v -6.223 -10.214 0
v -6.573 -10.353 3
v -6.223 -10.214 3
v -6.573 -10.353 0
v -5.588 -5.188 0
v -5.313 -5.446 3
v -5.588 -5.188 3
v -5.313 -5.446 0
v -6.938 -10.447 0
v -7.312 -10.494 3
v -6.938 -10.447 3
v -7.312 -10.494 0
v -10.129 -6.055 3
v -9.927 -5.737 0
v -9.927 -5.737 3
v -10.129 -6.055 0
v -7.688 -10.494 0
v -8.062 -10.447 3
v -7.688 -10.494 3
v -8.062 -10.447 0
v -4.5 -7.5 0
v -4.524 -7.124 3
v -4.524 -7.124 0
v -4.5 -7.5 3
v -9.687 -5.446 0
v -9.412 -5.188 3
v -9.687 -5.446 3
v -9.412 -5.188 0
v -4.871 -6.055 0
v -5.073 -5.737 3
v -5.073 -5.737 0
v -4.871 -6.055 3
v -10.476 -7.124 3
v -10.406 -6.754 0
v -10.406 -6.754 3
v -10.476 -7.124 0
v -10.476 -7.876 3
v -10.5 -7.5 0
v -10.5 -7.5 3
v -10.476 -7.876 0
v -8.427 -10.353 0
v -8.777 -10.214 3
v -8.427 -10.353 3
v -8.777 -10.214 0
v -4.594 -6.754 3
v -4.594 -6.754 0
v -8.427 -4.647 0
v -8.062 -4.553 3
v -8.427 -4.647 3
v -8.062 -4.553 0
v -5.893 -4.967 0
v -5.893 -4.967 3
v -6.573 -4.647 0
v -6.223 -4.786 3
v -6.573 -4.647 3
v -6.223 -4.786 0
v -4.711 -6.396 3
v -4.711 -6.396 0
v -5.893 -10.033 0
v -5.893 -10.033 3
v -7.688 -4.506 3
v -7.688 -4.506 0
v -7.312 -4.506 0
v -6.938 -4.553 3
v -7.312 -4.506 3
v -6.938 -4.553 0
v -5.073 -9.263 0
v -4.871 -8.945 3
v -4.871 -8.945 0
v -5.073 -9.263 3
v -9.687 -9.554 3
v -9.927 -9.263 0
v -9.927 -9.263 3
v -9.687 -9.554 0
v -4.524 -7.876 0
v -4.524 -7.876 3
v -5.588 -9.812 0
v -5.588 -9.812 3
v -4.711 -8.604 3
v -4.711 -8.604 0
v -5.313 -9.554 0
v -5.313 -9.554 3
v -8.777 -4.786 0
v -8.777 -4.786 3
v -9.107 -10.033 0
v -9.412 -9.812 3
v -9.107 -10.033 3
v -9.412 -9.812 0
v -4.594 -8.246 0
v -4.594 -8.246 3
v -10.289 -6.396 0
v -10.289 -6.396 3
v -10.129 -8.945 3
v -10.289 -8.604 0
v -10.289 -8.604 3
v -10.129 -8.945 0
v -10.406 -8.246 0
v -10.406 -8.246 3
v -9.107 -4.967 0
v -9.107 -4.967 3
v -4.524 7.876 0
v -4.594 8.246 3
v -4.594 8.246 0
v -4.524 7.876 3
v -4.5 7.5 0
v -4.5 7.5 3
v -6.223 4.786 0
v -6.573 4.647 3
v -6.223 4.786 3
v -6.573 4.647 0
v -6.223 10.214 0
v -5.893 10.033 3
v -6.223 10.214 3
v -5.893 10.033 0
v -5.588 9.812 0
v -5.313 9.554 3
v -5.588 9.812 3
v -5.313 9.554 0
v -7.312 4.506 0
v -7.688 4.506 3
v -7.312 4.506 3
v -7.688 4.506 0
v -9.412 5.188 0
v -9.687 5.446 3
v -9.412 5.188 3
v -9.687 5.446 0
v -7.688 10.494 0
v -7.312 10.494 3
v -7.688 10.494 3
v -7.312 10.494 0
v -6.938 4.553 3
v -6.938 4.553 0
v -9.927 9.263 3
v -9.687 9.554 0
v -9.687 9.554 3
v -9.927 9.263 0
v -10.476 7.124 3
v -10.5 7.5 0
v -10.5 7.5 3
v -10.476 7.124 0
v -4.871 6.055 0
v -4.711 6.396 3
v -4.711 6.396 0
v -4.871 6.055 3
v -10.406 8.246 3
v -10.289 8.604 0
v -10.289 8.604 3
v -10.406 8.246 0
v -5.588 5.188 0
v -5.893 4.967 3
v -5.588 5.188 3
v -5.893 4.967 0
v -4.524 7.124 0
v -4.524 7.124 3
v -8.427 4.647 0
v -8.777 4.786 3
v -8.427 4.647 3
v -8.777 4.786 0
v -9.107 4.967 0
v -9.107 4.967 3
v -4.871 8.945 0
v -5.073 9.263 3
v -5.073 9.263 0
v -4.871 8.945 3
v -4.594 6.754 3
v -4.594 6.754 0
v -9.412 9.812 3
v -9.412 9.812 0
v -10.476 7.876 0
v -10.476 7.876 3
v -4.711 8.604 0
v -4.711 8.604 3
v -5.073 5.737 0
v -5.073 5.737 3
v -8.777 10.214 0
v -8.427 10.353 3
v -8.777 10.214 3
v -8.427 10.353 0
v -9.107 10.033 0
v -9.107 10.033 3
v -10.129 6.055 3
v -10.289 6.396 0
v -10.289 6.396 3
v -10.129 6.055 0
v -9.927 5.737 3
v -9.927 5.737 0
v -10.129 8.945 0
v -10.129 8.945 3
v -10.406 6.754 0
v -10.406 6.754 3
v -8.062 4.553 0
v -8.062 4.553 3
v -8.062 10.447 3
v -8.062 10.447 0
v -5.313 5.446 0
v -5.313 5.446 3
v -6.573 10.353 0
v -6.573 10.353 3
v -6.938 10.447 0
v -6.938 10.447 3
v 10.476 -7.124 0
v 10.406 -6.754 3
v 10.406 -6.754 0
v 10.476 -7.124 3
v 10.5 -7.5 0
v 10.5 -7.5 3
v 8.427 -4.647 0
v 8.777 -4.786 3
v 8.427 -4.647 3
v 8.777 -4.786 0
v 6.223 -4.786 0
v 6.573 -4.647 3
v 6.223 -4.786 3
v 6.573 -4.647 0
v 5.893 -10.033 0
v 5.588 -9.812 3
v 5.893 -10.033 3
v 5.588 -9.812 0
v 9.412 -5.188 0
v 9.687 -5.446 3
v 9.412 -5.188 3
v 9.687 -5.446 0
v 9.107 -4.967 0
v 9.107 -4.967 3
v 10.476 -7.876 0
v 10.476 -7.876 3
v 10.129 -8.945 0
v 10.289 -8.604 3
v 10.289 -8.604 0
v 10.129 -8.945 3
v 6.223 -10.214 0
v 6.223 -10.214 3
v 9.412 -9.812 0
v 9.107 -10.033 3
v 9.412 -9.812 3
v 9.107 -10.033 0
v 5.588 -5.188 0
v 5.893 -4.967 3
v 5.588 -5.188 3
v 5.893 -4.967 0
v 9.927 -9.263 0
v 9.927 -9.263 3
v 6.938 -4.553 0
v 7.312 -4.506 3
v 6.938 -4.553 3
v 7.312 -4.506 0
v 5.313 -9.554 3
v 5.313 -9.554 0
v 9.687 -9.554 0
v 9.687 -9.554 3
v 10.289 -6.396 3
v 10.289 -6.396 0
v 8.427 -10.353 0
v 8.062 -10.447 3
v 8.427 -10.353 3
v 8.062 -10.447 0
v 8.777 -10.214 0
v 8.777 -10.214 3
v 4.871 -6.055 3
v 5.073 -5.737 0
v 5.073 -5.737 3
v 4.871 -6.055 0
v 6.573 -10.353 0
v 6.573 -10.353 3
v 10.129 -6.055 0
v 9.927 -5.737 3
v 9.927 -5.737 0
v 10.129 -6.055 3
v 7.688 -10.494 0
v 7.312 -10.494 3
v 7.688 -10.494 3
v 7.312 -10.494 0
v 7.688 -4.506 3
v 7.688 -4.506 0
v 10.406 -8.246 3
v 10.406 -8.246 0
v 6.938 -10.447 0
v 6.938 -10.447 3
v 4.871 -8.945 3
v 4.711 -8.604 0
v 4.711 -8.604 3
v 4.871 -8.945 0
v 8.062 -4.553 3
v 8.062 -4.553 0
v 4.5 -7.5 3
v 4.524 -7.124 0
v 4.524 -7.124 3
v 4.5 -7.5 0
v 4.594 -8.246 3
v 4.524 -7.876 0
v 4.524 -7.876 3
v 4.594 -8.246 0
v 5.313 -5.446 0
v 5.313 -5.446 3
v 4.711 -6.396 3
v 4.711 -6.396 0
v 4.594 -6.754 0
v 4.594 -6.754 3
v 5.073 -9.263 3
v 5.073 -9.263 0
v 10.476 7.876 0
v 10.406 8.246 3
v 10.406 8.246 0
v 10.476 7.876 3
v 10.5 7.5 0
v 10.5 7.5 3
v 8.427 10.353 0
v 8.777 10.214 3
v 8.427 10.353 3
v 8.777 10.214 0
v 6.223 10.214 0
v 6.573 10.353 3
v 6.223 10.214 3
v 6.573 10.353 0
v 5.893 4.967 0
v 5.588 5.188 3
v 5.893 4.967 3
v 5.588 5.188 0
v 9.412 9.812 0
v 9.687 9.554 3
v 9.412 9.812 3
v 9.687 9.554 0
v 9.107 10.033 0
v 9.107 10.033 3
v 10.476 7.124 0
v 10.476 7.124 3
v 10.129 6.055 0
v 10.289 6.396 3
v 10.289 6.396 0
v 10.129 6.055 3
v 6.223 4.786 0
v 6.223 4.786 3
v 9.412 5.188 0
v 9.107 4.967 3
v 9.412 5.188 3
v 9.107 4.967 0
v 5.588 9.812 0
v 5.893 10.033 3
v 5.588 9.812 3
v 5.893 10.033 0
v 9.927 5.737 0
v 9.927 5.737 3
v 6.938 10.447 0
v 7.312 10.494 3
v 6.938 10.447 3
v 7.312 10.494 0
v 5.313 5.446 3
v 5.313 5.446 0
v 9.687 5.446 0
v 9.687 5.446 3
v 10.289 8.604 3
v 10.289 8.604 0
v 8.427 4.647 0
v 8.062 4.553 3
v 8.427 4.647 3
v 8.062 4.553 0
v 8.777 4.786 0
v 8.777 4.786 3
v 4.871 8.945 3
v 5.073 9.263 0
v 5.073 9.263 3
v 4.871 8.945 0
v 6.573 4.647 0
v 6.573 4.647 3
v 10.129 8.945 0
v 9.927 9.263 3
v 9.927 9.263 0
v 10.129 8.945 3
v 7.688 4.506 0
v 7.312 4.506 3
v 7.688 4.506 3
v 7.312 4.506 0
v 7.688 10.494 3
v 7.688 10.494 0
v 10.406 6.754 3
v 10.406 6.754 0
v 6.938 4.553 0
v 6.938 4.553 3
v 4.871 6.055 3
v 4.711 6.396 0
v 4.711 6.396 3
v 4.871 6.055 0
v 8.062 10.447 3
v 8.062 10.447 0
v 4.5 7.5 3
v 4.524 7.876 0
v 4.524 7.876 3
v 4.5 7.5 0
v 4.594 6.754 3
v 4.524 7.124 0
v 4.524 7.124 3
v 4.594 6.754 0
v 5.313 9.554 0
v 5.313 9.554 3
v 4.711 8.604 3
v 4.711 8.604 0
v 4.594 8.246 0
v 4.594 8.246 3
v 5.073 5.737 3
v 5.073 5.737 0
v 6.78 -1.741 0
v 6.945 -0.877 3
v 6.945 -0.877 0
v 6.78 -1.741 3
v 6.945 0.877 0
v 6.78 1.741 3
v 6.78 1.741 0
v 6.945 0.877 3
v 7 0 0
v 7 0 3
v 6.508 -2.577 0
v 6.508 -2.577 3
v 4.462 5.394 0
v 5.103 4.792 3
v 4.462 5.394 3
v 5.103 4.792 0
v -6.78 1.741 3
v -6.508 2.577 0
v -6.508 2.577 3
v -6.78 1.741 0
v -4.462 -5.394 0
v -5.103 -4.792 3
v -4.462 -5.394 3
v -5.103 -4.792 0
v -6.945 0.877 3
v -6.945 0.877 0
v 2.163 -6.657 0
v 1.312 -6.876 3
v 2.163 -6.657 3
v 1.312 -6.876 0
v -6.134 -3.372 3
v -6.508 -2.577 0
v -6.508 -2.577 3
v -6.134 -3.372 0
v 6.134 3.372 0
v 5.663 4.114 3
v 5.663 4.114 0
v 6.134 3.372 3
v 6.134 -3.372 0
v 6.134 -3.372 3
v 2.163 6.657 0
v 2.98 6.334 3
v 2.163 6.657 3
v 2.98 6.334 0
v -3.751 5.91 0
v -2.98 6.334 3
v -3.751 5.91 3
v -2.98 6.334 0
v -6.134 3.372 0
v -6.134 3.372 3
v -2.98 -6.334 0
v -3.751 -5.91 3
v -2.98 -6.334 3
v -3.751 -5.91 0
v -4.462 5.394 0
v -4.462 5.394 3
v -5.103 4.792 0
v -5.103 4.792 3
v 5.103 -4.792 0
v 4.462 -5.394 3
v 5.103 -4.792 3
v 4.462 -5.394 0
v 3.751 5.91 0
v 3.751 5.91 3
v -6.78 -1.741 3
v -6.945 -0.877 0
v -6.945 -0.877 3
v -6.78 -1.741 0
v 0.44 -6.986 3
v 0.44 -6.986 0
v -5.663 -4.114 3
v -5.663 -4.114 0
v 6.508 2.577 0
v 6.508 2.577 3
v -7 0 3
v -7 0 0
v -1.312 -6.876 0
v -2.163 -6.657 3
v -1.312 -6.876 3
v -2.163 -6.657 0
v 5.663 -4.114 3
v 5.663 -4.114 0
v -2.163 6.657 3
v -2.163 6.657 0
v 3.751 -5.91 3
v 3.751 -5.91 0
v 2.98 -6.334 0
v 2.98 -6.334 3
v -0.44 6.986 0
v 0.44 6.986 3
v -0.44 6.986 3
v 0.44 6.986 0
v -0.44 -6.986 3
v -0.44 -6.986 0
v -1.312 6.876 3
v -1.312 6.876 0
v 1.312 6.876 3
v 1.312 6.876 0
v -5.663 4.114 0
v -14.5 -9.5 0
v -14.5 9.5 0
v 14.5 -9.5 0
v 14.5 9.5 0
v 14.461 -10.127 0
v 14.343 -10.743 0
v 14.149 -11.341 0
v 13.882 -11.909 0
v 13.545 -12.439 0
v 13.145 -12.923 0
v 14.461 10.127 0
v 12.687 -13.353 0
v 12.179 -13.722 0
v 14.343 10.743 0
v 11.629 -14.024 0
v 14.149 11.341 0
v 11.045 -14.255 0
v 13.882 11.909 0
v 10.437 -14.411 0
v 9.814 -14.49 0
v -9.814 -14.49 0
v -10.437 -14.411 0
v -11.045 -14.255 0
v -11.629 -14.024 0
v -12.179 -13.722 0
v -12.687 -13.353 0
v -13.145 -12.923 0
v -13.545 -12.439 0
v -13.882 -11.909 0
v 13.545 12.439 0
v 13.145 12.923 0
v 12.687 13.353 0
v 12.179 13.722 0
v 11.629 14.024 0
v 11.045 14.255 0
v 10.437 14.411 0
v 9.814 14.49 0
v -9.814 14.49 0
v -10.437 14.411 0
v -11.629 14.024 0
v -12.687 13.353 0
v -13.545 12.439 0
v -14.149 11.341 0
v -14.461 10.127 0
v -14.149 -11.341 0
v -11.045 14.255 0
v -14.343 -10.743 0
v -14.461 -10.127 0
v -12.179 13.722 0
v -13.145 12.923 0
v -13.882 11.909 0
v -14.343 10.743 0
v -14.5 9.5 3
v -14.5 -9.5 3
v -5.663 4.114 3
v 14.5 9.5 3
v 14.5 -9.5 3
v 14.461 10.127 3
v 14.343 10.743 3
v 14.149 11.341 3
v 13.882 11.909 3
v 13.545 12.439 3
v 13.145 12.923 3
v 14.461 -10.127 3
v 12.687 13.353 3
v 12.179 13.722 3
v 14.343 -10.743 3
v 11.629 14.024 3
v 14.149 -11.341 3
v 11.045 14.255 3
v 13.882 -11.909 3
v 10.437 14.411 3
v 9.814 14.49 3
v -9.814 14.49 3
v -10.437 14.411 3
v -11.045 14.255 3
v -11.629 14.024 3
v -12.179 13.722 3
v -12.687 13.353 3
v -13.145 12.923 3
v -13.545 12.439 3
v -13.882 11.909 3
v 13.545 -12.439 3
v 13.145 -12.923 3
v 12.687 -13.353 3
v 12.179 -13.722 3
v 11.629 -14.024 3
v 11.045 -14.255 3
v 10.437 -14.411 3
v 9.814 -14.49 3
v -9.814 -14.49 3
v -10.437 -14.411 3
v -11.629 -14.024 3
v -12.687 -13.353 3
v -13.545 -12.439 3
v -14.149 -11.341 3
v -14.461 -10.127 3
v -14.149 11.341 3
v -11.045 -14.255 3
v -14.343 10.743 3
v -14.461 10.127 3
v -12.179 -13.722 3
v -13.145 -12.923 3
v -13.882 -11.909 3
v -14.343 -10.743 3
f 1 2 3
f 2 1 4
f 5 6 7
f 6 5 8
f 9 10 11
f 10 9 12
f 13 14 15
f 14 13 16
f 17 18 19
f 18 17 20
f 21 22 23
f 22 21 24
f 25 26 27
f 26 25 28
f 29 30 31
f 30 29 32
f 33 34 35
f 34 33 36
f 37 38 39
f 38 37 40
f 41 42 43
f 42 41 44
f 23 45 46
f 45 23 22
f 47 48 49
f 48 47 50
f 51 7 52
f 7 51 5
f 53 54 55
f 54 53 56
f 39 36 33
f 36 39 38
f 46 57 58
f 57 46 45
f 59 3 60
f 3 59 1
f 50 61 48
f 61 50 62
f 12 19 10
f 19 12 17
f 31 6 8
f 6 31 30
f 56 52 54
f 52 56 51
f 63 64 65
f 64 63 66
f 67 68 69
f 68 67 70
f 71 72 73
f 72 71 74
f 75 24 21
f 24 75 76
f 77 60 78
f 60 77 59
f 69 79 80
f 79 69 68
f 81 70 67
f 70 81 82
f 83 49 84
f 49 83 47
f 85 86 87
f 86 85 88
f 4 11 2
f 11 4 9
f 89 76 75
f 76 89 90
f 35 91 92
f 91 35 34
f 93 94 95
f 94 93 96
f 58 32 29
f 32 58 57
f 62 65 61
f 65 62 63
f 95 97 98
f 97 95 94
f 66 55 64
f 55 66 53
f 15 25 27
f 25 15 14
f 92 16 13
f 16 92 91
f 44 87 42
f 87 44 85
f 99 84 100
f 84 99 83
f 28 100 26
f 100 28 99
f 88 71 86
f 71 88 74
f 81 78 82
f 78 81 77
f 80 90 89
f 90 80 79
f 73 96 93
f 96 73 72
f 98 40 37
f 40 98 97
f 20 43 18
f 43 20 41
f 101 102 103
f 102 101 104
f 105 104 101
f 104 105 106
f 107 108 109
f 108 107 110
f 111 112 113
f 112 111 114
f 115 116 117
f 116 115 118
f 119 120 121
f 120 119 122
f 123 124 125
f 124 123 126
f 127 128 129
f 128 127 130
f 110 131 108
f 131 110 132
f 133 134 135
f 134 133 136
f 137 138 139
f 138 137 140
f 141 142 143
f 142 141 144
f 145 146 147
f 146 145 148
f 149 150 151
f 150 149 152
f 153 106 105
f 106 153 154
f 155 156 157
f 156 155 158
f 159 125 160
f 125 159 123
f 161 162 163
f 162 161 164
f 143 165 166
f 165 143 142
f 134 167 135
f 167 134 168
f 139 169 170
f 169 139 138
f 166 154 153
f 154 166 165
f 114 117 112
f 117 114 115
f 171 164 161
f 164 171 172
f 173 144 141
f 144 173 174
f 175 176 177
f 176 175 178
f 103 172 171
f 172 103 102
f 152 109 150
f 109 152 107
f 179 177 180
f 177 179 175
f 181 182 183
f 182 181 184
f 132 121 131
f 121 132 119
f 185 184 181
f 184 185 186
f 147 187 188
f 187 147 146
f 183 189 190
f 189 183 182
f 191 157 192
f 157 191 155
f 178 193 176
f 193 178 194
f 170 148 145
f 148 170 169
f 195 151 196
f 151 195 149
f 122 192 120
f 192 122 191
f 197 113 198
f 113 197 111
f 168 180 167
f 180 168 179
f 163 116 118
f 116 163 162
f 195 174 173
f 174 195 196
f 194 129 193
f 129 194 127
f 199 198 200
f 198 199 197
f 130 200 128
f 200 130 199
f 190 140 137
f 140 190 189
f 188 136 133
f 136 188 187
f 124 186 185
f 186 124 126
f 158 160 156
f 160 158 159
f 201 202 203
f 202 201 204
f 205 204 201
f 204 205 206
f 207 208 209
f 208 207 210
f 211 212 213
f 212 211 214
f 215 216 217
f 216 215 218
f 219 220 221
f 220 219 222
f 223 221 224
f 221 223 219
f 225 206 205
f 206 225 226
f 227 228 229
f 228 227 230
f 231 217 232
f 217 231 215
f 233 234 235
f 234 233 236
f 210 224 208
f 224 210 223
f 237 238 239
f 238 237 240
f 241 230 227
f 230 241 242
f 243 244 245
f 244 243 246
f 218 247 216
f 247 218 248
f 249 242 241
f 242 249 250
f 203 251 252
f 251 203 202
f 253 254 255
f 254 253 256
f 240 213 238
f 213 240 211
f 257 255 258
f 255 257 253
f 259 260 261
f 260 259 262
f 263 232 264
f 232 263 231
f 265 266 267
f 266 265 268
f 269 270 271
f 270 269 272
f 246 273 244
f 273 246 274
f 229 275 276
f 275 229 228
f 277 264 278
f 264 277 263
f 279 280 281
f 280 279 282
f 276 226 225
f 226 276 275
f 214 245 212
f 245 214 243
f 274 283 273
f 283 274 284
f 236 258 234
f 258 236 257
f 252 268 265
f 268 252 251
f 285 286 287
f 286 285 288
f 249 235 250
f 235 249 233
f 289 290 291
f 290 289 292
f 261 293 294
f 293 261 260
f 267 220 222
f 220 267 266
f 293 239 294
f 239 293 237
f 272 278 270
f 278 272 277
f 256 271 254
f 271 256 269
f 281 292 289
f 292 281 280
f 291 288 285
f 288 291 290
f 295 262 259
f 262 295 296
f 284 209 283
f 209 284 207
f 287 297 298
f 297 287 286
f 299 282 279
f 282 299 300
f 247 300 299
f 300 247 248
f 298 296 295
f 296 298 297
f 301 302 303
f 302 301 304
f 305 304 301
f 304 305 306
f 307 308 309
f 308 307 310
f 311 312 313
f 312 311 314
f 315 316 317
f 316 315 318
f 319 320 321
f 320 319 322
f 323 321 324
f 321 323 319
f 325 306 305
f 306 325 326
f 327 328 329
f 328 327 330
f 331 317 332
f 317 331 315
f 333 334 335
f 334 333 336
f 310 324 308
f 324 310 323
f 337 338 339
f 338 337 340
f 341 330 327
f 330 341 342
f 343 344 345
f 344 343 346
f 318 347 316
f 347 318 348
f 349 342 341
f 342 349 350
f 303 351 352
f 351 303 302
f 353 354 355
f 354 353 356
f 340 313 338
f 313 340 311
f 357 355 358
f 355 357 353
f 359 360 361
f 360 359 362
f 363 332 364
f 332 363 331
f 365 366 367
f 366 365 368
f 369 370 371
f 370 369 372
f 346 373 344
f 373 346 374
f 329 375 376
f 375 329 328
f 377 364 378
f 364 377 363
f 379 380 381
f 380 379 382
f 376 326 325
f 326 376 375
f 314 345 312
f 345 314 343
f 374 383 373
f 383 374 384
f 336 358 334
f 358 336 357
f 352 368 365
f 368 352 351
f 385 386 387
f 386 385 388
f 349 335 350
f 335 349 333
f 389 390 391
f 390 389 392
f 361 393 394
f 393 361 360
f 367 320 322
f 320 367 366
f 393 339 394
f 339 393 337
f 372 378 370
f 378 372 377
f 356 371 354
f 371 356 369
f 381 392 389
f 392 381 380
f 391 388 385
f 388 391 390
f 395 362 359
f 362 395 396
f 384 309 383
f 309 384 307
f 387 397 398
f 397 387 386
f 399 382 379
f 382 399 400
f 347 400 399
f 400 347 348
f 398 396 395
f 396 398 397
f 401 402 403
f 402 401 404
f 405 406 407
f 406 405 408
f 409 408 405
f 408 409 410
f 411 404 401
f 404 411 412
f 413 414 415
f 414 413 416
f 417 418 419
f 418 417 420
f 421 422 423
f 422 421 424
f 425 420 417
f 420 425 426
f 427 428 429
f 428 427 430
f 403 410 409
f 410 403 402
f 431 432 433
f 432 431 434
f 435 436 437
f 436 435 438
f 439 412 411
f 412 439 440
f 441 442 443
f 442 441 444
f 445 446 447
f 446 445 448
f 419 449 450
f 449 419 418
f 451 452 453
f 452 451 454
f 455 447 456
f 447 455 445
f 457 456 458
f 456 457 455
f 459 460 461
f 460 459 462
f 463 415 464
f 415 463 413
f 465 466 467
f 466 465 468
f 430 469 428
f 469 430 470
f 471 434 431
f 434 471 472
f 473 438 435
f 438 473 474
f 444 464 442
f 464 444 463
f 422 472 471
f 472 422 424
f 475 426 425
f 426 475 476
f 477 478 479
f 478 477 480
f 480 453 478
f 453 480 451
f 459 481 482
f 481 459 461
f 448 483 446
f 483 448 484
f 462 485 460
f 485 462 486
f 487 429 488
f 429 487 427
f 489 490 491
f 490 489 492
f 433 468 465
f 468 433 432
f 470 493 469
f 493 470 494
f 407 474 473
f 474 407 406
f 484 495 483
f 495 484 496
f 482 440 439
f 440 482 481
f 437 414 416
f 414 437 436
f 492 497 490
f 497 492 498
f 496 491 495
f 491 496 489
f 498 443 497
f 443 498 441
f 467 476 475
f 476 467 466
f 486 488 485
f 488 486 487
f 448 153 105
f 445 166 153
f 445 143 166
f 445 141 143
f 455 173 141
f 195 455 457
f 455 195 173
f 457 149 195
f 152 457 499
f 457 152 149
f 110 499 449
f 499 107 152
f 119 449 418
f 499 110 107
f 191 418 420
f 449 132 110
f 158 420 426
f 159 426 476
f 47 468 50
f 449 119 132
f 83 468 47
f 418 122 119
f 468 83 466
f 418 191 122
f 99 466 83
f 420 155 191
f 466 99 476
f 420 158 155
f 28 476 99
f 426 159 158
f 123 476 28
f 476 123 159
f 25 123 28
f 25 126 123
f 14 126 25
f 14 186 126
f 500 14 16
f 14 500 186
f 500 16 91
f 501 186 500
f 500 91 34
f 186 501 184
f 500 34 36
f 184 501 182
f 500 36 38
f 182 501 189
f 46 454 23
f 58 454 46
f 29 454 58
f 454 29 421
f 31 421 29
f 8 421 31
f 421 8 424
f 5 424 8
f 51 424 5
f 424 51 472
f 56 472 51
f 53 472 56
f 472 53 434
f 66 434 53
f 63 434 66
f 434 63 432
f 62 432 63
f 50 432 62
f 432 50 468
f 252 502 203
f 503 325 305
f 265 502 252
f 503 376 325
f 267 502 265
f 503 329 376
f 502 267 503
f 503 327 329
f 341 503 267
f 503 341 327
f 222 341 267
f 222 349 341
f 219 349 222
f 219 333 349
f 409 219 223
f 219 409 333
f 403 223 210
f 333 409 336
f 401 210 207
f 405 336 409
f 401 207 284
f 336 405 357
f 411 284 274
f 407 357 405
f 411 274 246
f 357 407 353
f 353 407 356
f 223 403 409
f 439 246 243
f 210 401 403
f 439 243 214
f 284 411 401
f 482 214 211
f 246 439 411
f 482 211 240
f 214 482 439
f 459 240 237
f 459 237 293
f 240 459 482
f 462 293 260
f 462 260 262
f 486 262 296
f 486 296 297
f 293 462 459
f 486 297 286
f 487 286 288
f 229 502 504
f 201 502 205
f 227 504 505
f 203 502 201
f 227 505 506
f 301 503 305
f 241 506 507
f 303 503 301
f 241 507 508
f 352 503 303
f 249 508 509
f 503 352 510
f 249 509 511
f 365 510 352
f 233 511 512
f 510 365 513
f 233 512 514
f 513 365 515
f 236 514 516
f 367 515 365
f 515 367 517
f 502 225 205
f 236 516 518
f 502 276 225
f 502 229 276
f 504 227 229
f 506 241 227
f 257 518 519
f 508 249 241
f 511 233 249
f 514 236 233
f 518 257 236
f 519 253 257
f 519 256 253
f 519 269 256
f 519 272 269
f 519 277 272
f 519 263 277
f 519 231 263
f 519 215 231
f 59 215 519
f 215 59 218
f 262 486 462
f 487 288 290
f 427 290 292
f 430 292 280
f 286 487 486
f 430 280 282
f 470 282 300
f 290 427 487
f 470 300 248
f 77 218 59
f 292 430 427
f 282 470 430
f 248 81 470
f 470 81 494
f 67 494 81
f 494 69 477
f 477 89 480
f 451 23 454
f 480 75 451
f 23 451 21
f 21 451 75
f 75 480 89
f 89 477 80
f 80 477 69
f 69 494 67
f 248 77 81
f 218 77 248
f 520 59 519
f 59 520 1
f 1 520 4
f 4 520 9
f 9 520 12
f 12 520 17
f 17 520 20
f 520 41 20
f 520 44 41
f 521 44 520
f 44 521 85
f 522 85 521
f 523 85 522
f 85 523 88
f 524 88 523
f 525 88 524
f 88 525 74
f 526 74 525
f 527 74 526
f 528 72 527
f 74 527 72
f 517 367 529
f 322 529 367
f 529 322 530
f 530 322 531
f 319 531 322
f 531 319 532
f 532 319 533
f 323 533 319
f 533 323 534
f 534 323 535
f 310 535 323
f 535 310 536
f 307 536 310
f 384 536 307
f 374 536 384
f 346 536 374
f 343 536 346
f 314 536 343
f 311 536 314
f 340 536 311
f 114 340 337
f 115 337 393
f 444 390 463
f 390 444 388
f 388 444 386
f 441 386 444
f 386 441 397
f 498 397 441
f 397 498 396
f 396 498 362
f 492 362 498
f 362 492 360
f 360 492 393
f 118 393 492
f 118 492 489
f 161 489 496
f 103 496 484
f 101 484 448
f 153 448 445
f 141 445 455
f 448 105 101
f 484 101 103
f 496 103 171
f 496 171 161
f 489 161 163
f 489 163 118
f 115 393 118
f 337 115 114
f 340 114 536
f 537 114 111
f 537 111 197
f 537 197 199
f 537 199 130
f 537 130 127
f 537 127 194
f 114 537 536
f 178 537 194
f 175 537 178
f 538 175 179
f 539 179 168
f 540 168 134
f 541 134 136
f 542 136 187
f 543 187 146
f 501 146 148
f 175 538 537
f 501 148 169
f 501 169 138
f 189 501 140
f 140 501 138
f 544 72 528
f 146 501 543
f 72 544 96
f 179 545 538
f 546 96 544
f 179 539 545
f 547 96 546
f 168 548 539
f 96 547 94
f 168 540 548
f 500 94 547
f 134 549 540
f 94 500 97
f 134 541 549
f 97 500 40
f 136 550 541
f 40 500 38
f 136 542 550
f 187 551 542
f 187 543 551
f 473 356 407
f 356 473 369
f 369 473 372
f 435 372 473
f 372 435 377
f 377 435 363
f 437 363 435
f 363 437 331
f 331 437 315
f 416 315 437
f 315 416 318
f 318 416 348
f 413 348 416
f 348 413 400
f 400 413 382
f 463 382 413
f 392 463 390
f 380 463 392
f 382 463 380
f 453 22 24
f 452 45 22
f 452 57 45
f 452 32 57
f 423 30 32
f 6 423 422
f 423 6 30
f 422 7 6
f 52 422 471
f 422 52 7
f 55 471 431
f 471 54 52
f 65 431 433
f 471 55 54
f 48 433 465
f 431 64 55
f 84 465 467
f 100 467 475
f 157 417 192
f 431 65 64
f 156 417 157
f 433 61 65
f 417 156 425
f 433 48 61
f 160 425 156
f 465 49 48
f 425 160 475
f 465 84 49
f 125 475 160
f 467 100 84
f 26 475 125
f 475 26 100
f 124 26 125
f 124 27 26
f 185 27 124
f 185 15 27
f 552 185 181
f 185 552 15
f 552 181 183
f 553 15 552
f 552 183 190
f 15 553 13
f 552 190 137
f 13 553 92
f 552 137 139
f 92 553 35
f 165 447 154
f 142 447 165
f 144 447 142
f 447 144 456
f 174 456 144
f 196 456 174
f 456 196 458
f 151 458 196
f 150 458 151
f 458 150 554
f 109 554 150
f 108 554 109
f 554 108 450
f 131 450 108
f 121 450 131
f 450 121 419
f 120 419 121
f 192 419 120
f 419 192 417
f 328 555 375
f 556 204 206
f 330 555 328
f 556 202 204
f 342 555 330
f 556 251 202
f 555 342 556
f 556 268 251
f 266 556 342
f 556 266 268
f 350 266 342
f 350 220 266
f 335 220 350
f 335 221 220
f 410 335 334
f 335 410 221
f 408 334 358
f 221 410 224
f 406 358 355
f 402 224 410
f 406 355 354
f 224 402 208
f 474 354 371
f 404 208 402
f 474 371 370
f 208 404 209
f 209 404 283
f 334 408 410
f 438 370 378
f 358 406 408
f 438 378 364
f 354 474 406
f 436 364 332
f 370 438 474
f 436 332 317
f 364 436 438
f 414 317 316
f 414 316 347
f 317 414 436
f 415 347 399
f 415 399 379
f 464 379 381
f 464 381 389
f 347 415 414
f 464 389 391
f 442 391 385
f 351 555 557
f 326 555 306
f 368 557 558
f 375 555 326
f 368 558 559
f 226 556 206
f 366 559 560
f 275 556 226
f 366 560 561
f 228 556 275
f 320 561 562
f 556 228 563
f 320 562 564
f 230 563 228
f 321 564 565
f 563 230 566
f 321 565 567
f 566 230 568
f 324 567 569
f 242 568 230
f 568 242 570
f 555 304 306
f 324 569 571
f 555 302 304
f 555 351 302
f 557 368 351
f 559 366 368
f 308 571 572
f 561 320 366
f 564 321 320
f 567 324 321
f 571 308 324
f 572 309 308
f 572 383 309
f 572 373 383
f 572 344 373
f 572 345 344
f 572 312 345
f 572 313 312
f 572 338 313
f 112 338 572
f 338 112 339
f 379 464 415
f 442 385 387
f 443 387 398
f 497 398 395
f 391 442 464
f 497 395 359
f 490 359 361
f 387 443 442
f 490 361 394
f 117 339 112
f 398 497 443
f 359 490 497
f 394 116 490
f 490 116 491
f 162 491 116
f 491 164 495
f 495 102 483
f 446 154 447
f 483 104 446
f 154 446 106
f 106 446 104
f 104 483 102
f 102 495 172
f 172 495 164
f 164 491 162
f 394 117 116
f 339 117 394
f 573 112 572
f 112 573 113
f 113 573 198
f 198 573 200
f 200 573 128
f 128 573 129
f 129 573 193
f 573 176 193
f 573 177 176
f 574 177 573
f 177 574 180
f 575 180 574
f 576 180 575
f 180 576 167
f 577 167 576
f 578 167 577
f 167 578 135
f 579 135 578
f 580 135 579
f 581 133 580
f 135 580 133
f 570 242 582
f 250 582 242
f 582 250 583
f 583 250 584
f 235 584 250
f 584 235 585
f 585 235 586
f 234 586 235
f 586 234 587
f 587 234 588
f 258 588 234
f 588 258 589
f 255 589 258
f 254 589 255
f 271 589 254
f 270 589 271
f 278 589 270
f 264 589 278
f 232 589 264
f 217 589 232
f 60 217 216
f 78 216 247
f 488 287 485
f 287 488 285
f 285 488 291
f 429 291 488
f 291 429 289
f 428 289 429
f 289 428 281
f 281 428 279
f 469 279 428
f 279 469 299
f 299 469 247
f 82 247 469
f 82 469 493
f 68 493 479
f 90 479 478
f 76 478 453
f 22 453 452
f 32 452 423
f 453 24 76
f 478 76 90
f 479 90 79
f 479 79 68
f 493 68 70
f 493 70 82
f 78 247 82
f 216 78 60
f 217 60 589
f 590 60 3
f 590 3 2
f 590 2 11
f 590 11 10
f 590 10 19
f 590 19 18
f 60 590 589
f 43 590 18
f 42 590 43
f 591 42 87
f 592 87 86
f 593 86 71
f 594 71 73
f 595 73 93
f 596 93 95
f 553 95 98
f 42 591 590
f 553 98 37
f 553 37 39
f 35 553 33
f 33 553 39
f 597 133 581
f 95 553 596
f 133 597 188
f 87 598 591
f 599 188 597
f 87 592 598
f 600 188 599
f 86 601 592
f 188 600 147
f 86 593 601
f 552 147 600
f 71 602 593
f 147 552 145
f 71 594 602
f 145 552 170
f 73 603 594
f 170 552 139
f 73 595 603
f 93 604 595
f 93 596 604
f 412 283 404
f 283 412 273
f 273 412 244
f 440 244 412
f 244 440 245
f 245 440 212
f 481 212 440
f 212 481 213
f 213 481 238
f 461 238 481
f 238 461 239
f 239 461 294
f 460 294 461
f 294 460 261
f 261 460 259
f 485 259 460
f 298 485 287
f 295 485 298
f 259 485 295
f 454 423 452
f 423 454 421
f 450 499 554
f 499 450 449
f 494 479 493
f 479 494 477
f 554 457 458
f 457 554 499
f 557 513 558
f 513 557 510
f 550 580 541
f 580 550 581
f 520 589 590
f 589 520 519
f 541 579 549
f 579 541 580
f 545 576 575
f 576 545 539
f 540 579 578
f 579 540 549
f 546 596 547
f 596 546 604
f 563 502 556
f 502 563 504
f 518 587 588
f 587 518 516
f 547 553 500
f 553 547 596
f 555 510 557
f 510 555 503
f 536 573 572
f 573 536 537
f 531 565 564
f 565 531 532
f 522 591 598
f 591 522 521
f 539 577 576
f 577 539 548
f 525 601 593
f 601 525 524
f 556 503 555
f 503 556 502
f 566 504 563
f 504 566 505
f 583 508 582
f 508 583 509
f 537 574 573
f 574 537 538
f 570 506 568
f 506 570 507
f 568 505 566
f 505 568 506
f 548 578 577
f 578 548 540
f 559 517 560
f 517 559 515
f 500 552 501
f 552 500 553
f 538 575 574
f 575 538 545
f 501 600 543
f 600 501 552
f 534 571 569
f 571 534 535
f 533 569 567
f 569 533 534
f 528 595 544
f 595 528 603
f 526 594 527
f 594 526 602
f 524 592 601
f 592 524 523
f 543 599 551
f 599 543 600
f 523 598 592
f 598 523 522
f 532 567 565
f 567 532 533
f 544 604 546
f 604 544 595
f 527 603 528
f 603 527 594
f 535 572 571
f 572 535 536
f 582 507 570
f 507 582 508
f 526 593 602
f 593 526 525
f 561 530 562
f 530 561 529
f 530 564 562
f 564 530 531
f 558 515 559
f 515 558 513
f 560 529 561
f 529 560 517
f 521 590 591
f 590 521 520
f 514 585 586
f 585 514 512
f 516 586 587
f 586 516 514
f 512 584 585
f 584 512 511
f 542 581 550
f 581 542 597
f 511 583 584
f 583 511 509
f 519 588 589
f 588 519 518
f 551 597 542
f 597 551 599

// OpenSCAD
$fn = 50;


difference() {
	union() {
		hull() {
			translate(v = [-9.5000000000, 9.5000000000, 0]) {
				cylinder(h = 3, r = 5);
			}
			translate(v = [9.5000000000, 9.5000000000, 0]) {
				cylinder(h = 3, r = 5);
			}
			translate(v = [-9.5000000000, -9.5000000000, 0]) {
				cylinder(h = 3, r = 5);
			}
			translate(v = [9.5000000000, -9.5000000000, 0]) {
				cylinder(h = 3, r = 5);
			}
		}
	}
	union() {
		#translate(v = [-7.5000000000, -7.5000000000, -100.0000000000]) {
			cylinder(h = 200, r = 3.0000000000);
		}
		#translate(v = [-7.5000000000, 7.5000000000, -100.0000000000]) {
			cylinder(h = 200, r = 3.0000000000);
		}
		#translate(v = [7.5000000000, -7.5000000000, -100.0000000000]) {
			cylinder(h = 200, r = 3.0000000000);
		}
		#translate(v = [7.5000000000, 7.5000000000, -100.0000000000]) {
			cylinder(h = 200, r = 3.0000000000);
		}
		#cylinder(h = 3, r = 7.0000000000);
	}
}
